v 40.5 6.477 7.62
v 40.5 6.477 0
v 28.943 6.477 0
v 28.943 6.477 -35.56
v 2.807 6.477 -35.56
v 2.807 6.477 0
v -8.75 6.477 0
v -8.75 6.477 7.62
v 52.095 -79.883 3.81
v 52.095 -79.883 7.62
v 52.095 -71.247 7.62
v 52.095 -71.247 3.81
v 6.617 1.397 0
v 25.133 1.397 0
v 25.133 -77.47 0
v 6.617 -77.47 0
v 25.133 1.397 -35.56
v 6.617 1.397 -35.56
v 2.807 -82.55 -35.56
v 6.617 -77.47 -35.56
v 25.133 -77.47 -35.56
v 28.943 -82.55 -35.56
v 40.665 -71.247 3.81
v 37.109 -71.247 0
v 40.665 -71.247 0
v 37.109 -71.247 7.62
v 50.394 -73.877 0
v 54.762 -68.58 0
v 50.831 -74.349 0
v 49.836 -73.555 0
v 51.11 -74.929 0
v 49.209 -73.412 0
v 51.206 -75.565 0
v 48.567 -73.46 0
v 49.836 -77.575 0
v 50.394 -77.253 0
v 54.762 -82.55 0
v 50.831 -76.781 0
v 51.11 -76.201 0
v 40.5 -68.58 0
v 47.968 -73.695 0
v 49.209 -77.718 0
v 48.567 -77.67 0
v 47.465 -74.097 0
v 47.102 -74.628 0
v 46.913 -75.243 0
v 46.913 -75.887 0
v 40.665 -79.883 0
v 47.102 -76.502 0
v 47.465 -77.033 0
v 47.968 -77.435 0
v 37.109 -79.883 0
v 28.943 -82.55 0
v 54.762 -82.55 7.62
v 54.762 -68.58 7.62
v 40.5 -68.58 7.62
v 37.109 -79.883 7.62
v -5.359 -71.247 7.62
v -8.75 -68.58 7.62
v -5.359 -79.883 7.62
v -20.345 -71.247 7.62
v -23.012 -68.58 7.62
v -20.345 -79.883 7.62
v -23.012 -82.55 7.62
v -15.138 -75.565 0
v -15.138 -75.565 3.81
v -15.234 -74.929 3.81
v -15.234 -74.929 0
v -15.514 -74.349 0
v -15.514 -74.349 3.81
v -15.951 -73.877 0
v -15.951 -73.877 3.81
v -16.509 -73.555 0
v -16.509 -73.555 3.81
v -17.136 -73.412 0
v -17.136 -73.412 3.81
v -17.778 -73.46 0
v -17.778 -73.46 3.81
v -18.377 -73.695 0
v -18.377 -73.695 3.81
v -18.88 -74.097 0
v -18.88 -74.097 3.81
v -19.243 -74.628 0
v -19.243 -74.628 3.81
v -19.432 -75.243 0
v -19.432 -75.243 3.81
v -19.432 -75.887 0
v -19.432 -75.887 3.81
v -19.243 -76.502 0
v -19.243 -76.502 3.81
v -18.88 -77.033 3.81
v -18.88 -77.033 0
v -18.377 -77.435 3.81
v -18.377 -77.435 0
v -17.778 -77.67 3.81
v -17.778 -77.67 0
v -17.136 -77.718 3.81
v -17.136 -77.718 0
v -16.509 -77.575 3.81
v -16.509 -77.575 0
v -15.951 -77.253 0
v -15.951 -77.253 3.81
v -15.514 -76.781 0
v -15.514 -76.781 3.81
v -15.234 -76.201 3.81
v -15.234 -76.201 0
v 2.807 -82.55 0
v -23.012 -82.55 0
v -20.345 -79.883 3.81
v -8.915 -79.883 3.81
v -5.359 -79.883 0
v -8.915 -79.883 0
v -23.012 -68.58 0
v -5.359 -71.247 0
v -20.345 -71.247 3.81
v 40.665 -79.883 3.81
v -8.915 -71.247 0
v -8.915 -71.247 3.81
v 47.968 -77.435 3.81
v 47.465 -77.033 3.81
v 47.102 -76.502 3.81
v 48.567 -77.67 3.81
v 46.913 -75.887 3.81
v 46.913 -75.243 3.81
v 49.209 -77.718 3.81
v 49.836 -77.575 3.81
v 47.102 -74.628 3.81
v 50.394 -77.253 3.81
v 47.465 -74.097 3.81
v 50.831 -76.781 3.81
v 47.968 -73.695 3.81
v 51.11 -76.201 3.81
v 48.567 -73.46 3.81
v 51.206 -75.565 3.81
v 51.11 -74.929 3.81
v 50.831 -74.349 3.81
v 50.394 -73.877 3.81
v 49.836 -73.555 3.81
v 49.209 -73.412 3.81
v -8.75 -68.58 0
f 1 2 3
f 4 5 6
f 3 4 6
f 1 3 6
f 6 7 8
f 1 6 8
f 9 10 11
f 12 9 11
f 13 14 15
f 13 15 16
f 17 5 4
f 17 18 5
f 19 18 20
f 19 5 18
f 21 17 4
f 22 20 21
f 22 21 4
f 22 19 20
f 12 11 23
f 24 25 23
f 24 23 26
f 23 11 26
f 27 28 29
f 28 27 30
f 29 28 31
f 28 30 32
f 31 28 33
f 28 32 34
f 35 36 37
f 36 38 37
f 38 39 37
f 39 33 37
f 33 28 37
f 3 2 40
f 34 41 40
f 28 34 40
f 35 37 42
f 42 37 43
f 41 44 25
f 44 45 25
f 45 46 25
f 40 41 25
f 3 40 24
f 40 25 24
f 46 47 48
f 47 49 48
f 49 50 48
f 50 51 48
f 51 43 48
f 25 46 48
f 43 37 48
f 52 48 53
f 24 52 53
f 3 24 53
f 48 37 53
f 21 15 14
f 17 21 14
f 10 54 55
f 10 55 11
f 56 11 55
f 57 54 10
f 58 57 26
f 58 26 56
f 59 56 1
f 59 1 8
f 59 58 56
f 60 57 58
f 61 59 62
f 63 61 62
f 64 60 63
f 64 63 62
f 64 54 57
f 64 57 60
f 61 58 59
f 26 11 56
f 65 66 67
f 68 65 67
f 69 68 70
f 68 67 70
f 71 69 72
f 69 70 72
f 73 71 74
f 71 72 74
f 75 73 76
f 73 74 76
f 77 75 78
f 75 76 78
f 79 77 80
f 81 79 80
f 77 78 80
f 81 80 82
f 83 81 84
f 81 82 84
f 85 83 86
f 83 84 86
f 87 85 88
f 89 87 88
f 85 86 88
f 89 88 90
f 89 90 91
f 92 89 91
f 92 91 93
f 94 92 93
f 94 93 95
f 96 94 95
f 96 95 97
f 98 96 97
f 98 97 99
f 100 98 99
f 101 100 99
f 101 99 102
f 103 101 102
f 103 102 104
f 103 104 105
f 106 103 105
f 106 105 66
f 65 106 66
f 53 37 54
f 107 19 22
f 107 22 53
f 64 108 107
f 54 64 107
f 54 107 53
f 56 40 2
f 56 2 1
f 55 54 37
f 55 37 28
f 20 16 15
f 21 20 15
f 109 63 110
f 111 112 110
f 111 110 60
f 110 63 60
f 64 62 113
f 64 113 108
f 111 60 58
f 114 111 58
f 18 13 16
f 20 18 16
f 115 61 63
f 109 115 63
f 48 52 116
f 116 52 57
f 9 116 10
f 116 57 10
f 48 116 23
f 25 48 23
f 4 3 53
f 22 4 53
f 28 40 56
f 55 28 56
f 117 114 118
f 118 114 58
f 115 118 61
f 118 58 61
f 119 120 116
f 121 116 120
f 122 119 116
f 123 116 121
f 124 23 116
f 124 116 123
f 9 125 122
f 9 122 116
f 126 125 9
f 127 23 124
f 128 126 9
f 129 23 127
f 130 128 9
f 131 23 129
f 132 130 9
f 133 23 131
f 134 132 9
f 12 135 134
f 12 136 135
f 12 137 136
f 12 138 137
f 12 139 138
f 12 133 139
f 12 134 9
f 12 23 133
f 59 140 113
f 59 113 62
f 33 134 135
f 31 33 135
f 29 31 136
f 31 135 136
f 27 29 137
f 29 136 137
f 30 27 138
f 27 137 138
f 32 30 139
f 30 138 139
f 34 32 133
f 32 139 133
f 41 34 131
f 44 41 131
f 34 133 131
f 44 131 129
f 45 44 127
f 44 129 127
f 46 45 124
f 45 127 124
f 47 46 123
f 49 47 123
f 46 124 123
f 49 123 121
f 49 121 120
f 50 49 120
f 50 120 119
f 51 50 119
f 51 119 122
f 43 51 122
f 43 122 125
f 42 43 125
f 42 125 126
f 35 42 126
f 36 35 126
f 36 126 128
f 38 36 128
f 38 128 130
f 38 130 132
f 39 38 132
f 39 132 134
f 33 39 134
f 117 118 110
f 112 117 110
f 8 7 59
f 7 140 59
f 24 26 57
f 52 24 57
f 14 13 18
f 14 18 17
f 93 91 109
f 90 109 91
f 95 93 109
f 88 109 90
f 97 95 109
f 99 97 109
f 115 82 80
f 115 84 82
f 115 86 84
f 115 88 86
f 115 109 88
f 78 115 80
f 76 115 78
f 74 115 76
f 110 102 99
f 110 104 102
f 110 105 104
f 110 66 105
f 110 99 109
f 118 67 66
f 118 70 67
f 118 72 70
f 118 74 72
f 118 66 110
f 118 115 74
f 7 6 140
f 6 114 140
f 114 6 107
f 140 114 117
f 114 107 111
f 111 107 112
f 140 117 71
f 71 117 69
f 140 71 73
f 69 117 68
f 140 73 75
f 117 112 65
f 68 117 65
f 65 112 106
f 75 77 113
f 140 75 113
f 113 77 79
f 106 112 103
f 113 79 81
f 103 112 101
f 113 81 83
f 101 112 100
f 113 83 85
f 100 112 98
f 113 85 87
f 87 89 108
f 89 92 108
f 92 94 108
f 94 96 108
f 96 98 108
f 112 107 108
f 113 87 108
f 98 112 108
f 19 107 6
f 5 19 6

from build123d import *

# Parameters (mm, degrees)
F0_W      = 31.75
F0_H      = 63.5
F1_DEPTH  = 7.62
F2_W      = 11.7348
F2_H      = 7.62
F3_DEPTH  = 19.05
F4_W      = 13.97
F4_H      = 7.62
F5_DEPTH  = 33.02
F6_W      = 13.97
F6_H      = 7.62
F7_DEPTH  = 33.02
F8_R      = 2.159
F8_W      = 0.508
F8_H      = 7.62
F8_W_2    = 2.54
F9_DEPTH  = 7.621
F10_DEPTH = 10.0076
F11_DEPTH = 10.0076
F8_W_3    = 10.922
F12_DEPTH = 3.81
F13_DEPTH = 8.75000028
F14_DEPTH = 8.75000028
F15_DEPTH = 6.477
F16_W     = 18.51600056
F16_H     = 5.08
F17_DEPTH = 35.56


with BuildPart() as f1:
    # F0 (on Top) → F1 (new body)
    with BuildSketch(Plane.XY):
        with Locations((15.875, -31.75)):
            Rectangle(F0_W, F0_H)
    extrude(amount=F1_DEPTH)

    # F2 (on face) → F3 (join)
    with BuildSketch(Plane.XZ.offset(63.5)):
        with Locations((15.875, 3.81)):
            Rectangle(F2_W, F2_H)
    extrude(amount=F3_DEPTH)

    # F4 (on face) → F5 (join)
    with BuildSketch(Plane(origin=(10.0076, 0, 0), x_dir=(0, -1, 0), z_dir=(-1, 0, 0))):
        with Locations((75.565, 3.81)):
            Rectangle(F4_W, F4_H)
    extrude(amount=F5_DEPTH)

    # F6 (on face) → F7 (join)
    with BuildSketch(Plane.YZ.offset(21.7424)):
        with Locations((-75.565, 3.81)):
            Rectangle(F6_W, F6_H)
    extrude(amount=F7_DEPTH)

    # F8 (on face) → F9 (cut, through all)
    with BuildSketch(Plane.XY.offset(7.62)):
        with Locations((49.0474, -75.565)):
            Circle(F8_R)
        Polygon((37.6174, -71.755), (40.1574, -71.755), (40.6654, -71.755), (40.6654, -71.247), (37.1094, -71.247), (37.1094, -79.883), (40.6654, -79.883), (40.6654, -79.375), (40.1574, -79.375), (37.6174, -79.375), align=None)
        with Locations((40.4114, -75.565)):
            Rectangle(F8_W, F8_H)
        with Locations((38.8874, -75.565)):
            Rectangle(F8_W_2, F8_H)
        with Locations((-17.2974, -75.565)):
            Circle(F8_R)
        Polygon((-8.4074, -71.755), (-5.8674, -71.755), (-5.8674, -79.375), (-8.4074, -79.375), (-8.9154, -79.375), (-8.9154, -79.883), (-5.3594, -79.883), (-5.3594, -71.247), (-8.9154, -71.247), (-8.9154, -71.755), align=None)
        with Locations((-8.6614, -75.565)):
            Rectangle(F8_W, F8_H)
        with Locations((-7.1374, -75.565)):
            Rectangle(F8_W_2, F8_H)
    extrude(amount=-F9_DEPTH, mode=Mode.SUBTRACT)

    # F10 (add): a face of the model
    f10_faces = [f1.faces().sort_by_distance(p)[0] for p in [
        (10.0076, -66.04, 3.81),
    ]]
    extrude(f10_faces, amount=F10_DEPTH)

    # F11 (add): a face of the model
    f11_faces = [f1.faces().sort_by_distance(p)[0] for p in [
        (21.7424, -66.04, 3.81),
    ]]
    extrude(f11_faces, amount=F11_DEPTH)

    # F8 (on face) → F12 (cut)
    with BuildSketch(Plane.XY.offset(7.62)):
        with Locations((46.1264, -75.565)):
            Rectangle(F8_W_3, F8_H)
        with Locations((49.0474, -75.565)):
            Circle(F8_R, mode=Mode.SUBTRACT)
        Polygon((40.6654, -71.247), (40.6654, -71.755), (51.5874, -71.755), (51.5874, -79.375), (40.6654, -79.375), (40.6654, -79.883), (52.0954, -79.883), (52.0954, -71.247), align=None)
        with Locations((-14.3764, -75.565)):
            Rectangle(F8_W_3, F8_H)
        with Locations((-17.2974, -75.565)):
            Circle(F8_R, mode=Mode.SUBTRACT)
        Polygon((-19.8374, -71.755), (-8.9154, -71.755), (-8.9154, -71.247), (-20.3454, -71.247), (-20.3454, -79.883), (-8.9154, -79.883), (-8.9154, -79.375), (-19.8374, -79.375), align=None)
    extrude(amount=-F12_DEPTH, mode=Mode.SUBTRACT)

    # F13 (add): a face of the model
    f13_faces = [f1.faces().sort_by_distance(p)[0] for p in [
        (0, -34.29, 3.81),
    ]]
    extrude(f13_faces, amount=F13_DEPTH)

    # F14 (add): a face of the model
    f14_faces = [f1.faces().sort_by_distance(p)[0] for p in [
        (31.75, -34.29, 3.81),
    ]]
    extrude(f14_faces, amount=F14_DEPTH)

    # F15 (add): a face of the model
    f15_faces = [f1.faces().sort_by_distance(p)[0] for p in [
        (15.875, 0, 3.81),
    ]]
    extrude(f15_faces, amount=F15_DEPTH)

    # F16 (on face) → F17 (join)
    with BuildSketch(Plane(origin=(0, 0, 0), x_dir=(1, 0, 0), z_dir=(0, 0, -1))):
        with Locations((15.875, -3.937)):
            Rectangle(F16_W, F16_H)
        with Locations((15.875, 80.01)):
            Rectangle(F16_W, F16_H)
        Polygon((2.80699972, -6.477), (6.61699972, -6.477), (6.61699972, -1.397), (6.61699972, 77.47), (6.61699972, 82.55), (2.80699972, 82.55), align=None)
        Polygon((25.13300028, -1.397), (25.13300028, -6.477), (28.94300028, -6.477), (28.94300028, 82.55), (25.13300028, 82.55), (25.13300028, 77.47), align=None)
    extrude(amount=F17_DEPTH)


solid = f1.part
